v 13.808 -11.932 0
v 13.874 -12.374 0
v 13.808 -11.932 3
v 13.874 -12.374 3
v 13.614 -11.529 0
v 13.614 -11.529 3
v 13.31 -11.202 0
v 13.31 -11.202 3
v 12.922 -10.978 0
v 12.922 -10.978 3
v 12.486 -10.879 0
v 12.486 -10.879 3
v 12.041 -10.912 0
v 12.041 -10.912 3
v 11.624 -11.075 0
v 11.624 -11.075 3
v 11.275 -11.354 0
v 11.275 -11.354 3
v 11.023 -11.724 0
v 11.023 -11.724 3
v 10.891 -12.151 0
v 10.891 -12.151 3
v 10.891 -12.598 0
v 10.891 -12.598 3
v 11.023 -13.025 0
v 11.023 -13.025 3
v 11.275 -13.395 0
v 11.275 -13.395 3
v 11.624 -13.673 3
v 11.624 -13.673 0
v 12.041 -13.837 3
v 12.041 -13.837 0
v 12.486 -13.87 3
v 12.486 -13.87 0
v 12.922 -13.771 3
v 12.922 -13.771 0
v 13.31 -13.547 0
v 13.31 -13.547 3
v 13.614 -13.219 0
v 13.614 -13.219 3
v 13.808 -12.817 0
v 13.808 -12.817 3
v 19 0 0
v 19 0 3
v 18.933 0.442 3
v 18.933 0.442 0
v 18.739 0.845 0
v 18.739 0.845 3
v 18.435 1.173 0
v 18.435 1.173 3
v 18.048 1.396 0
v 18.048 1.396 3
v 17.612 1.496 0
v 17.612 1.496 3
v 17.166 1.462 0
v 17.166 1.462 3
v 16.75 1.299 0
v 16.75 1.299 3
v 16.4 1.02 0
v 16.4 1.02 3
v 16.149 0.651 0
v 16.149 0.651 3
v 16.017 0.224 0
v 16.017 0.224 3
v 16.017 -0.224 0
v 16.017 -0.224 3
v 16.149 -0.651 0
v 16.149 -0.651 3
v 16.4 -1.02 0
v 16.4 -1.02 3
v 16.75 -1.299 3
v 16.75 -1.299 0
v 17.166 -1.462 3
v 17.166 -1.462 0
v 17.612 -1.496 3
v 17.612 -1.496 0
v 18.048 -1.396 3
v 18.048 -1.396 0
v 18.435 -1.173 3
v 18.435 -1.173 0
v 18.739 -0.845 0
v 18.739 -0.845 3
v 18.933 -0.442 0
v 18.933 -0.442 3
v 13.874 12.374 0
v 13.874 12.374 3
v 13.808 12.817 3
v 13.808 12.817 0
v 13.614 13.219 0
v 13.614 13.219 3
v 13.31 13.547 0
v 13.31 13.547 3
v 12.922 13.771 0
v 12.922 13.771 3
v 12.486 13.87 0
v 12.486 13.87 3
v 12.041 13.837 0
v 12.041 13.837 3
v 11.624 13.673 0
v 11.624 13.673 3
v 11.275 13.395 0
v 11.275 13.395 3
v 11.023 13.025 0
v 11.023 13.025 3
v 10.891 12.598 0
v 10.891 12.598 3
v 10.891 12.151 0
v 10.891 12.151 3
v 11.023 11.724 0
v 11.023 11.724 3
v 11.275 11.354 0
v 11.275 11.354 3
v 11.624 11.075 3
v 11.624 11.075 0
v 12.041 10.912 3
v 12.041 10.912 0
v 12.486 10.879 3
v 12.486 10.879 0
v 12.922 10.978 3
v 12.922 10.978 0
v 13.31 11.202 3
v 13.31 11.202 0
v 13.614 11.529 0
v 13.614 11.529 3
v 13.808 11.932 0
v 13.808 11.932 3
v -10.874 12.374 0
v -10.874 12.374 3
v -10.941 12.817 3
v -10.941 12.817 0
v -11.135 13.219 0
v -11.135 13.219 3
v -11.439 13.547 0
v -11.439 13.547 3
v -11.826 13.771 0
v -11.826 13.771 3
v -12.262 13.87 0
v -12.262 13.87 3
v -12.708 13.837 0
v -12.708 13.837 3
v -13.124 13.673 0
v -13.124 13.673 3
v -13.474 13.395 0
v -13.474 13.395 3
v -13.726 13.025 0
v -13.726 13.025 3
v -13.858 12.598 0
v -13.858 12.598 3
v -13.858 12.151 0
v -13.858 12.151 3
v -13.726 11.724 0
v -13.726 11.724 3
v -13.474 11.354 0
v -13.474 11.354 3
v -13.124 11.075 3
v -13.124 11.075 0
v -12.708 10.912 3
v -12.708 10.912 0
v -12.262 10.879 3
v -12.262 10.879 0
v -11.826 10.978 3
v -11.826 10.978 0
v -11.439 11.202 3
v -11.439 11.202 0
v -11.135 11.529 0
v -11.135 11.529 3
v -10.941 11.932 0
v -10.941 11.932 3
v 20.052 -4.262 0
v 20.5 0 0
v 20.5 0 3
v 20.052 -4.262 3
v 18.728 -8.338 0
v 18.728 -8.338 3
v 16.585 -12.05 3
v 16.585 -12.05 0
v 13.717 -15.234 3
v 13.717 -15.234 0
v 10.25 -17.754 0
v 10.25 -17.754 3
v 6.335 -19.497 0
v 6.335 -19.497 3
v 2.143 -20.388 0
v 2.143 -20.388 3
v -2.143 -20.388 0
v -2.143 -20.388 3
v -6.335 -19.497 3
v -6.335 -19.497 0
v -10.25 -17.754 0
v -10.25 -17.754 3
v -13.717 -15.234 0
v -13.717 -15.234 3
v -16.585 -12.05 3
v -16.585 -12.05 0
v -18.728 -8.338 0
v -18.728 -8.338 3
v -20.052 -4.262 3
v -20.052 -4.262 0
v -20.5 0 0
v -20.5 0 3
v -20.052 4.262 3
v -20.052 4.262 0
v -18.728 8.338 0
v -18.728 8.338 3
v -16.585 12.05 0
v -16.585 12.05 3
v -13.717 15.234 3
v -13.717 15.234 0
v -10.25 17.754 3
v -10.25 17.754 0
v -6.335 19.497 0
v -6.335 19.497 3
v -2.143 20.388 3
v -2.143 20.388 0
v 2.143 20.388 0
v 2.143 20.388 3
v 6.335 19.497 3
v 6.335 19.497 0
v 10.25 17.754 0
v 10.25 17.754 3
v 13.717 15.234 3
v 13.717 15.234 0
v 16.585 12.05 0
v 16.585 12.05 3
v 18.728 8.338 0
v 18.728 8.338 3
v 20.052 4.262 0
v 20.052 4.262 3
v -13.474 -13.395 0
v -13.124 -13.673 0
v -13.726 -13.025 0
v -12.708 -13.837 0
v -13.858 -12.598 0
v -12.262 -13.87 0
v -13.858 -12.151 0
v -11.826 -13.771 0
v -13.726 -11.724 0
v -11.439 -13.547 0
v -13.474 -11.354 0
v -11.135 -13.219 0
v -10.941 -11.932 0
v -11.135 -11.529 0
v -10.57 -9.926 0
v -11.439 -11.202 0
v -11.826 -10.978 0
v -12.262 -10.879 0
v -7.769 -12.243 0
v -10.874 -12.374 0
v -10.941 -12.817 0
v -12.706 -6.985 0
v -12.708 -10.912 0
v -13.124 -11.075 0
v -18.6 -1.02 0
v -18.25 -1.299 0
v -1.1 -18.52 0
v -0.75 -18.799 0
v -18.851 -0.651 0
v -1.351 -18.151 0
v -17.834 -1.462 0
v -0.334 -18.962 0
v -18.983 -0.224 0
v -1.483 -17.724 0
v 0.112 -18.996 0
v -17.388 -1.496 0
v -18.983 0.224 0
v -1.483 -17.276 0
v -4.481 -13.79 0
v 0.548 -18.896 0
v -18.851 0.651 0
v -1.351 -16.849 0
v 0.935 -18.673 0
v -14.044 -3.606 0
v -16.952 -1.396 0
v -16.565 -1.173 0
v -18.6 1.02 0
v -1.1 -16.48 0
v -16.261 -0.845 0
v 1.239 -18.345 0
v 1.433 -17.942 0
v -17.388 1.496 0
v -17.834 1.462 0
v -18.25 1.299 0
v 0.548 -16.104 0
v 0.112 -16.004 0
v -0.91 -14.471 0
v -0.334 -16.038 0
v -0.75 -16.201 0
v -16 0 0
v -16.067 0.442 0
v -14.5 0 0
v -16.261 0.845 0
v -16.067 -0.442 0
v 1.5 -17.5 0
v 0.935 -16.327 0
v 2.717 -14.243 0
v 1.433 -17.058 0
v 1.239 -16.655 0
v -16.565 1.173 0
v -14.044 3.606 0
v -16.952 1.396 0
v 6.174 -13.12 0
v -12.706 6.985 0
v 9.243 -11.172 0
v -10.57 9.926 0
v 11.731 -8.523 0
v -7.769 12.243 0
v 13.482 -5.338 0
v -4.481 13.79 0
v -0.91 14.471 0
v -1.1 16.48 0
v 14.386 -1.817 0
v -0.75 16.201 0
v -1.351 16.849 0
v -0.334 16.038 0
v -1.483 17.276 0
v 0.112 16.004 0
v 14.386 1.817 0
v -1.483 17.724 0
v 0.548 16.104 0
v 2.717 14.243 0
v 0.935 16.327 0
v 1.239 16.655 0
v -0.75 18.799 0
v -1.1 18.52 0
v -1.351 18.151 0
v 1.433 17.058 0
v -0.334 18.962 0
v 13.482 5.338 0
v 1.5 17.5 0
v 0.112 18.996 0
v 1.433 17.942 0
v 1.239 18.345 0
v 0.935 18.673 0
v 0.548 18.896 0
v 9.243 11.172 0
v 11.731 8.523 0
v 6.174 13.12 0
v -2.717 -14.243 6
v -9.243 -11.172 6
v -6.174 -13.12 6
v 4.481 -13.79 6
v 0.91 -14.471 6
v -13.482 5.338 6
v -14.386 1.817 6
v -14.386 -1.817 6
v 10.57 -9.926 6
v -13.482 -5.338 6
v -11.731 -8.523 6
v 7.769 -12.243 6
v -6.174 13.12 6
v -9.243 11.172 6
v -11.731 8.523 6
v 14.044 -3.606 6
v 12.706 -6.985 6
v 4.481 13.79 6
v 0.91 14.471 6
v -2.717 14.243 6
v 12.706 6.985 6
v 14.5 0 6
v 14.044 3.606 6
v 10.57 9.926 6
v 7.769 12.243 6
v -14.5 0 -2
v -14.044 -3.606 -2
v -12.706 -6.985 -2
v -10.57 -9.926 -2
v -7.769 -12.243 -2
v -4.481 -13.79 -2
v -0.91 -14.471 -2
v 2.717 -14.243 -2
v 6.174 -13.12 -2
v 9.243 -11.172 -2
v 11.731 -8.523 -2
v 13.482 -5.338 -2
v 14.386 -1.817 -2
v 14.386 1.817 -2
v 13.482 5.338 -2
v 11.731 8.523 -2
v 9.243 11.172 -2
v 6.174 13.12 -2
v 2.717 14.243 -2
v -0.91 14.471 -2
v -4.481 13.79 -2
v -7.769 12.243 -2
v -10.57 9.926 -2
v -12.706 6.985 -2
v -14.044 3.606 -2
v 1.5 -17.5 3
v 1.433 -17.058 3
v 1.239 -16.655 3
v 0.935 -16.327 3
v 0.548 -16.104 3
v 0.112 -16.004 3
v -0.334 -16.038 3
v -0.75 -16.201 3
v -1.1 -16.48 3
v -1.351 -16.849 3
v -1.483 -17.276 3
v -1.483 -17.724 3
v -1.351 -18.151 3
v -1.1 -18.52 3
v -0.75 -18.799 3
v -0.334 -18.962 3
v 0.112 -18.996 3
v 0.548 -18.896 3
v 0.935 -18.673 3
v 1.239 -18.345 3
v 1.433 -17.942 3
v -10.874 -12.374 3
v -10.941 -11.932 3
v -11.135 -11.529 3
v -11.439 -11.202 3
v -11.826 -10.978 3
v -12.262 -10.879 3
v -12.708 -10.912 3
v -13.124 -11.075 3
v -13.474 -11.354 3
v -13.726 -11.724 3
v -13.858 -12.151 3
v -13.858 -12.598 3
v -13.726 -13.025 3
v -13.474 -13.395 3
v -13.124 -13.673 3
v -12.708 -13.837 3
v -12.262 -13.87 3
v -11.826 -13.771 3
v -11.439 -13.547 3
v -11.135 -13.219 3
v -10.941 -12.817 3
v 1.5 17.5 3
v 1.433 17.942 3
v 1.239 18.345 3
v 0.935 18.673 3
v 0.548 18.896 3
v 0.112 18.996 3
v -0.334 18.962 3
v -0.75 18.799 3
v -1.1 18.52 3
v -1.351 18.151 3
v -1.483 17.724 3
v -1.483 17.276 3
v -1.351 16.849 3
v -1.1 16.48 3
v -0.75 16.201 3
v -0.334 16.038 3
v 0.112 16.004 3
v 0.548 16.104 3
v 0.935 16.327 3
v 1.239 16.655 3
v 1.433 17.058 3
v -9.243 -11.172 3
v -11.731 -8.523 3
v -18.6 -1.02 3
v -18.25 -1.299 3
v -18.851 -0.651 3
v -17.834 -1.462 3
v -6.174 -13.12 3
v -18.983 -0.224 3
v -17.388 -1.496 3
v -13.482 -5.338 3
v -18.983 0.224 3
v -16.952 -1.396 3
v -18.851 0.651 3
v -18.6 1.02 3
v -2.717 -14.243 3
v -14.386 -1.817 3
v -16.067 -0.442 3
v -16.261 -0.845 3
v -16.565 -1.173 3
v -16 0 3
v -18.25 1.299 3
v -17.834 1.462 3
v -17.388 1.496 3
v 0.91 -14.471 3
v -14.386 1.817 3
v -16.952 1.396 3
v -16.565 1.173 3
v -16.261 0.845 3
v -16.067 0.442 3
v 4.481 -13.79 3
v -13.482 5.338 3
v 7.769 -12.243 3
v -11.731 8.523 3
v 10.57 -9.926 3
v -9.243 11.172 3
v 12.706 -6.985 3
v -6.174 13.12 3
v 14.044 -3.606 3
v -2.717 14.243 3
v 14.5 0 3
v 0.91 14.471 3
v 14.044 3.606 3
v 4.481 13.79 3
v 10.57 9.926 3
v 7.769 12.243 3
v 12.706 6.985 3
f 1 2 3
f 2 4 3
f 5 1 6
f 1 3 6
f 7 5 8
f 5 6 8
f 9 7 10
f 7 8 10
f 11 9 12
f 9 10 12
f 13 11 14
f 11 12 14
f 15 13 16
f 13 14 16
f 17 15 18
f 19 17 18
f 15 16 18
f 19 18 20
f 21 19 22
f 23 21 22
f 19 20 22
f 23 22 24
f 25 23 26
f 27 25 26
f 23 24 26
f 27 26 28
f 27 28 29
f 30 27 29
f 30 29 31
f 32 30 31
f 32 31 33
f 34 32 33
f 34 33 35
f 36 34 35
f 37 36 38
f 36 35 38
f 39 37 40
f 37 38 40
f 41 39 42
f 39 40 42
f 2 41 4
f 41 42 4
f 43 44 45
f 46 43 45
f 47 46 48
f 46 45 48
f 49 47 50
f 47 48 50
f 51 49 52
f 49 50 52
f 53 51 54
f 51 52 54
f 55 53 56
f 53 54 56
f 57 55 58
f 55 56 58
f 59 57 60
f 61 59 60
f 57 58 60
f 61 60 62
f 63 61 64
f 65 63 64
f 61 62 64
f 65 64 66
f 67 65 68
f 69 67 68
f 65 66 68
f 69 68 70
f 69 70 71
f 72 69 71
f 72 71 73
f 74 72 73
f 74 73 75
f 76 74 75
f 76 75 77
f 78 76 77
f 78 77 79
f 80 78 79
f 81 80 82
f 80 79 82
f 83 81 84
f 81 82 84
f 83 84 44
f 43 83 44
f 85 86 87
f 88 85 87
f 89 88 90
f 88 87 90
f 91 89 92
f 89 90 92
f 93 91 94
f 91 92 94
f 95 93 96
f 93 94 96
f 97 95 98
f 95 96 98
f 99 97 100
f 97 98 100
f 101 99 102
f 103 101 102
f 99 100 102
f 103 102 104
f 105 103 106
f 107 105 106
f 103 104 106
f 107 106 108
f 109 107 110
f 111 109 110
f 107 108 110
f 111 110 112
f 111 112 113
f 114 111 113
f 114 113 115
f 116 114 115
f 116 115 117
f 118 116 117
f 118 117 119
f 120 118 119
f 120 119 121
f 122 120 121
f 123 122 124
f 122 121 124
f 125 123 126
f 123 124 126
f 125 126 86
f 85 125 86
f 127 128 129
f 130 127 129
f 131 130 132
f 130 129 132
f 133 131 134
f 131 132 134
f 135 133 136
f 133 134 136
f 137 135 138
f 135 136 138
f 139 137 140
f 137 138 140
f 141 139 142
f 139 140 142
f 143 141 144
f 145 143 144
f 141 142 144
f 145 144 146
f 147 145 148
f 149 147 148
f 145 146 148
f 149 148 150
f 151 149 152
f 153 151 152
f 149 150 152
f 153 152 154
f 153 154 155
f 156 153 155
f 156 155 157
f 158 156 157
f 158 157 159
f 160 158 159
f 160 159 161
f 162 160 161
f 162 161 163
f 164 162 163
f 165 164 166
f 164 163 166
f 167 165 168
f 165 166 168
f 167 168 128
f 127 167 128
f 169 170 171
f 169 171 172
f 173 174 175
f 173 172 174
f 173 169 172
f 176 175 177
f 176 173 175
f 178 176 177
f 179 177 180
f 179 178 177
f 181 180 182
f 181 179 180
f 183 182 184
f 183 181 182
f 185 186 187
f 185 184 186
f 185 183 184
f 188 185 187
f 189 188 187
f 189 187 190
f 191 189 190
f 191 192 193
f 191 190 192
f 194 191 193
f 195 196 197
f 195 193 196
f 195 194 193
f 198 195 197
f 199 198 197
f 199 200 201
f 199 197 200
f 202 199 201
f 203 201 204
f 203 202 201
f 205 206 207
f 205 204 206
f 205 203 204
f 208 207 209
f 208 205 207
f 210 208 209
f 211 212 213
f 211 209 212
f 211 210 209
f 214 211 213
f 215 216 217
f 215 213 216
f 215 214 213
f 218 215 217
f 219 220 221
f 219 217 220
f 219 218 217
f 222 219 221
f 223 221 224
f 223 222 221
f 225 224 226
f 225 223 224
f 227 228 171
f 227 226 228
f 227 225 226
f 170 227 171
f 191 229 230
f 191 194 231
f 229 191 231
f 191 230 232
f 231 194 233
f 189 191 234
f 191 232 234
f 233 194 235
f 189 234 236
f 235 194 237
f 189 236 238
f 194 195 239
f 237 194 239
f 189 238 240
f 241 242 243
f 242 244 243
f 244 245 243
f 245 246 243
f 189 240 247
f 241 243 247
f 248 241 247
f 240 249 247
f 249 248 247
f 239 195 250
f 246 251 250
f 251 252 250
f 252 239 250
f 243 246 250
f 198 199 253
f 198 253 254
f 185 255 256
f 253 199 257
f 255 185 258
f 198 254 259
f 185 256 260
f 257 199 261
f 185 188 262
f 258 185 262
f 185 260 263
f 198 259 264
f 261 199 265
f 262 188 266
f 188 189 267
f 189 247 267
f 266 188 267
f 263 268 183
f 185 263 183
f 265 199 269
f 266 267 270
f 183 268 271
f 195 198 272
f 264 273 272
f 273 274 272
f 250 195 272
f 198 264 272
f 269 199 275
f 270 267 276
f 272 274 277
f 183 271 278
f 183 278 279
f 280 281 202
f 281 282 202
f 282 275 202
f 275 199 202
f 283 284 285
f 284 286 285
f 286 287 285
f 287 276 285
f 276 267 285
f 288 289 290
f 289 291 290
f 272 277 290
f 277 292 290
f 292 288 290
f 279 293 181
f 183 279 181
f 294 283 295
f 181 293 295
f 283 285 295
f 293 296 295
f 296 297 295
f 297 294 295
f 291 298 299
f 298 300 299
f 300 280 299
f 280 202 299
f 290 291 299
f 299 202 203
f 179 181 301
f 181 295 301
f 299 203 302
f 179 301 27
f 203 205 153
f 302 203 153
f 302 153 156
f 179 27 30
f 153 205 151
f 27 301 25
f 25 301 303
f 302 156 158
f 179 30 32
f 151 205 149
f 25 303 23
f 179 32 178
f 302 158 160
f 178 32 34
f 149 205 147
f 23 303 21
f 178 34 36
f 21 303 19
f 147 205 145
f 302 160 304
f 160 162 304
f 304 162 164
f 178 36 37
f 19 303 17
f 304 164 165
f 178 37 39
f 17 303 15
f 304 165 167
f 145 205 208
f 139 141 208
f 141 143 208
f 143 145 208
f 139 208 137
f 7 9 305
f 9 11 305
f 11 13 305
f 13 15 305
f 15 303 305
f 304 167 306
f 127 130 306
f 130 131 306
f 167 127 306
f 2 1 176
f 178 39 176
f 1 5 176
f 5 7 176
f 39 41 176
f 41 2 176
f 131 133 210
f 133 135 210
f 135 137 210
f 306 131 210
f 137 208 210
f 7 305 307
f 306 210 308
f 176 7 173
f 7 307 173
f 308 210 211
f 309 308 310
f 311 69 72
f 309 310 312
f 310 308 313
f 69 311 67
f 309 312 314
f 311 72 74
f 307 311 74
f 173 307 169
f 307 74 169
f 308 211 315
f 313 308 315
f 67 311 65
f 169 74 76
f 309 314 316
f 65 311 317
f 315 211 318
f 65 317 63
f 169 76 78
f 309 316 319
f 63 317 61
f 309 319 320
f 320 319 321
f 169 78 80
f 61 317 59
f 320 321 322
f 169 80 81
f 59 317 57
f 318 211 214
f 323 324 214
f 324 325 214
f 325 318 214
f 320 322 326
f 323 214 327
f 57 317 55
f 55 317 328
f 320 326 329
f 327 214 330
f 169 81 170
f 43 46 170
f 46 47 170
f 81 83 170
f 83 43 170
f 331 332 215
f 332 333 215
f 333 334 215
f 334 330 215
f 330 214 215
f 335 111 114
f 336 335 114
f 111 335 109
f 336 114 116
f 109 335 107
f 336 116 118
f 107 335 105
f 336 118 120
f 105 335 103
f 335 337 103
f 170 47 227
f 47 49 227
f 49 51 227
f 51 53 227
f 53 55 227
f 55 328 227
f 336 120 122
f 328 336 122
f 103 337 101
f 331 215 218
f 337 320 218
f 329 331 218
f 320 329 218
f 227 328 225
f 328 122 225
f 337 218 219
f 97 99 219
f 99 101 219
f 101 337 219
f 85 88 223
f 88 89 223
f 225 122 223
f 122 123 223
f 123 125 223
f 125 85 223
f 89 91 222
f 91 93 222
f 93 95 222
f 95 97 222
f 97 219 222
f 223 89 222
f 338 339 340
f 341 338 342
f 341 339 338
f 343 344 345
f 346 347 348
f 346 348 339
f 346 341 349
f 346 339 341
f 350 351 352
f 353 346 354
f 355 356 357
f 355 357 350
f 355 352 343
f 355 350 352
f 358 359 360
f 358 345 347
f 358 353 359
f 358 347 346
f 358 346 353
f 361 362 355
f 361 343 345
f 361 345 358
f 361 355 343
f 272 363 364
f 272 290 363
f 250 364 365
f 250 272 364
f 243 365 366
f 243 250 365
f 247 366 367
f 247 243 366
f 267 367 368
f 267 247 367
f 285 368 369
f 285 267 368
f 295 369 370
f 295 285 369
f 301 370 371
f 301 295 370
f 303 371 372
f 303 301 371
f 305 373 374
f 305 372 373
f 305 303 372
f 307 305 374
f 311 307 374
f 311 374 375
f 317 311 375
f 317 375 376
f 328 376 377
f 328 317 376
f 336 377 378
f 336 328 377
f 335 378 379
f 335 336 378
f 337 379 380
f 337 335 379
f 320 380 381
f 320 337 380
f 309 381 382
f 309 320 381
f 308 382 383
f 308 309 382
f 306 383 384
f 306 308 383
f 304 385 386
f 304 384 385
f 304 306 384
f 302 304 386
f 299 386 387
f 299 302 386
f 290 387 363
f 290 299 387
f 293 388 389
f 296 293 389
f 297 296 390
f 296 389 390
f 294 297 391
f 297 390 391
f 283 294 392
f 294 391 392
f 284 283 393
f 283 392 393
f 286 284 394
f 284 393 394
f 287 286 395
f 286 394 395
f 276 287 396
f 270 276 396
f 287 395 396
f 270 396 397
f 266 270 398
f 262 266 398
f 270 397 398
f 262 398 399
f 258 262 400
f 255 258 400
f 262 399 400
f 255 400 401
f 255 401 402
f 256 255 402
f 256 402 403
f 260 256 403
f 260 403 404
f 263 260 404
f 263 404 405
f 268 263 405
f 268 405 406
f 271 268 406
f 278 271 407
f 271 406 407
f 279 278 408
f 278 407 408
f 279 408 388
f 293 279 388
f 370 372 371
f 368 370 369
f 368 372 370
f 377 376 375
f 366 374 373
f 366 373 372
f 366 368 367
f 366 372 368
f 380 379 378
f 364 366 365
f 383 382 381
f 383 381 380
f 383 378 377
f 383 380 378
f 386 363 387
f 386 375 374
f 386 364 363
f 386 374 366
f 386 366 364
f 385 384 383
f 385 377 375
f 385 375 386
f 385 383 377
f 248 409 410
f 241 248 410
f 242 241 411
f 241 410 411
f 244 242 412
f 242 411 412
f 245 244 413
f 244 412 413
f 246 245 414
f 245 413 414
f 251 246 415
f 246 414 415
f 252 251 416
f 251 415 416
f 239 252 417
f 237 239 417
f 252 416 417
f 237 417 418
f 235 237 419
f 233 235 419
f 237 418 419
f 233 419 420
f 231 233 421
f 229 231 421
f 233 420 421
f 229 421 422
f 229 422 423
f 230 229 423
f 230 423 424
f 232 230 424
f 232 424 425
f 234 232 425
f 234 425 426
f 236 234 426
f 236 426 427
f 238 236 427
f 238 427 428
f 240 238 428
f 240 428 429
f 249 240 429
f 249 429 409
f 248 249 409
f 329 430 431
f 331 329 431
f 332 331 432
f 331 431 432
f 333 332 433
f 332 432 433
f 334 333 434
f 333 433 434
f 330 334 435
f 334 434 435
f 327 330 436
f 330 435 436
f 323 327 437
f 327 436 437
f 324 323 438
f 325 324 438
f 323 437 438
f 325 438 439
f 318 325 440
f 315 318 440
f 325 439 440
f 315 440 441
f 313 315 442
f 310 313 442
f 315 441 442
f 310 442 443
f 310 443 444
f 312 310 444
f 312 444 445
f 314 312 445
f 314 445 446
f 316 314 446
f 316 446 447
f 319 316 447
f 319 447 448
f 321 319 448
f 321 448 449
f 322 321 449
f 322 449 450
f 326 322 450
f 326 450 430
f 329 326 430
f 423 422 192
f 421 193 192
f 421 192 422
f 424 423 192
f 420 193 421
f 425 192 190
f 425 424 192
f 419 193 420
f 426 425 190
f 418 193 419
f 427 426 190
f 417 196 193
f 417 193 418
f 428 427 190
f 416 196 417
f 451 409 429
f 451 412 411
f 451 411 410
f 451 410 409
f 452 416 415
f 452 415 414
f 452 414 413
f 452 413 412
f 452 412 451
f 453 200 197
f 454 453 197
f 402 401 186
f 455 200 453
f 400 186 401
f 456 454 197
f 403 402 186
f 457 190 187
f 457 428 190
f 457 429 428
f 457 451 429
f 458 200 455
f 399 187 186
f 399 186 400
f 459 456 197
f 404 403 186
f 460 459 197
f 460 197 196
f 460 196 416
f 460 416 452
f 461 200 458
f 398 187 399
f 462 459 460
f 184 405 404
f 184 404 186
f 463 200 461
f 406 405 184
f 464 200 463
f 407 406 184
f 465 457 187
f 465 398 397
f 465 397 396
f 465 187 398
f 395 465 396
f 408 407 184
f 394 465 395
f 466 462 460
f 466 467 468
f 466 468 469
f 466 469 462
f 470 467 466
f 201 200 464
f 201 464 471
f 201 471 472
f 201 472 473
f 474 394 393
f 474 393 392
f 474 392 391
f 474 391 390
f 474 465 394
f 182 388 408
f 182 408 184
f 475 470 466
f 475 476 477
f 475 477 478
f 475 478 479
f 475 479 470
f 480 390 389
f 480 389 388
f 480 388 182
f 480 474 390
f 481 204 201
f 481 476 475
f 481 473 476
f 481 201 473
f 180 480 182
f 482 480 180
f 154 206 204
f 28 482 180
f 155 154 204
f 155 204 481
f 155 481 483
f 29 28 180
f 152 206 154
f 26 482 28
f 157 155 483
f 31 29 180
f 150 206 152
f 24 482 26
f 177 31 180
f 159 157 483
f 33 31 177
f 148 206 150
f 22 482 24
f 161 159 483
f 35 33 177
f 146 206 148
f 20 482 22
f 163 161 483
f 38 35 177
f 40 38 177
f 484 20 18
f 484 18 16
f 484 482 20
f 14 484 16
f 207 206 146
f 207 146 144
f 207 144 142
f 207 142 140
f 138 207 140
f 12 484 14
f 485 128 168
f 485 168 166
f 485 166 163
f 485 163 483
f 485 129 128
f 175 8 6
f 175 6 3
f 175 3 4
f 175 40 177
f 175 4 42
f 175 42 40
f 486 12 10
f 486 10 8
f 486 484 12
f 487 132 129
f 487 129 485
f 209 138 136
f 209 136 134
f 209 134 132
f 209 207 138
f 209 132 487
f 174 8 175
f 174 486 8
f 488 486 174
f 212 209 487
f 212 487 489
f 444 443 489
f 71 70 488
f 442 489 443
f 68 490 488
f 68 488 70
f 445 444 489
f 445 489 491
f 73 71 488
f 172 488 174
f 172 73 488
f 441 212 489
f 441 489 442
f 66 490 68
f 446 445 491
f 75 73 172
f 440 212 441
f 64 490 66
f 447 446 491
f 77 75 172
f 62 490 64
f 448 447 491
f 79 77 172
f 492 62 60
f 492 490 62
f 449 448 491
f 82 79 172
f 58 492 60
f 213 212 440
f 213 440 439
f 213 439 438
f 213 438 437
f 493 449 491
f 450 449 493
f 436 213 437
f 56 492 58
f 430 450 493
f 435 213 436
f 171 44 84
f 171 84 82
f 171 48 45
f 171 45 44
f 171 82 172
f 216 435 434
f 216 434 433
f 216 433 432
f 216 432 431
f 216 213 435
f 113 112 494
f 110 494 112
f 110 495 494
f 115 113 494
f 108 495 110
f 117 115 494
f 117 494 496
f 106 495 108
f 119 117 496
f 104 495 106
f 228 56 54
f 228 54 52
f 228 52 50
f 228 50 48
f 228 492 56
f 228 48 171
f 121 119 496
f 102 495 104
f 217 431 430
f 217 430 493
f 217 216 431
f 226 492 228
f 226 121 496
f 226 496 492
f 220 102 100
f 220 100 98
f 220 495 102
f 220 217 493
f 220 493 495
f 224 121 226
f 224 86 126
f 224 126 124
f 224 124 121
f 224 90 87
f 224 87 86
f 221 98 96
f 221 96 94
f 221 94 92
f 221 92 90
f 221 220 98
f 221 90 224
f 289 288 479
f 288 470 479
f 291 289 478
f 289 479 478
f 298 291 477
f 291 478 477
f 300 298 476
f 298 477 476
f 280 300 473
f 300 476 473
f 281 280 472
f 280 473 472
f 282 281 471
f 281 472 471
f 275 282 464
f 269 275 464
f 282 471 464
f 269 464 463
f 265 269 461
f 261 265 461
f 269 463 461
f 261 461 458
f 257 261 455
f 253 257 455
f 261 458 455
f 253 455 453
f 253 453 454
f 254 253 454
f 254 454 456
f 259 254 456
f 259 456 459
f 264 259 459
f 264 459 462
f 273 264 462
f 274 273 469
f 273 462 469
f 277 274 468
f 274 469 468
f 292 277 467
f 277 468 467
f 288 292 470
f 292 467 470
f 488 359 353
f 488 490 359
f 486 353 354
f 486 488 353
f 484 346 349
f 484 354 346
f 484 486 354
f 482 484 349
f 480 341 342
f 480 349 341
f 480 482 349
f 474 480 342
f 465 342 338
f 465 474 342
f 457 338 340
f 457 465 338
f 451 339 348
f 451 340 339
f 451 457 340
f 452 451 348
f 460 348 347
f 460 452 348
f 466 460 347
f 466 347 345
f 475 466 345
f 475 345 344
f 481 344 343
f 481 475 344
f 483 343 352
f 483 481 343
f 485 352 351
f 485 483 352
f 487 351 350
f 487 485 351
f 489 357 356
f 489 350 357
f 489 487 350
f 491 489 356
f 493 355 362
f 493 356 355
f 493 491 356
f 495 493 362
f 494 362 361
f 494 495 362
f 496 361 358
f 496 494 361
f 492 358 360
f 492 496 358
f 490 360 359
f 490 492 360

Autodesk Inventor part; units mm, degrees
ref_plane "YZ Plane" through (0, 0, 0) normal (1, 0, 0) x (0, 1, 0)
ref_plane "XZ Plane" through (0, 0, 0) normal (0, 1, 0) x (-1, 0, 0)
ref_plane "XY Plane" through (0, 0, 0) normal (0, 0, 1) x (1, 0, 0)
sketch "Sketch1" plane through (0, 0, 0) normal (0, 0, 1) x (1, 0, 0)
  circle A0 centre (0, 0) radius 20.5
  dimension "d0" = 41
extrude "Extrusion1" add sketch "Sketch1" along normal blind 3
sketch "Sketch2" plane through (0, 0, 3) normal (0, 0, 1) x (1, 0, 0)
  circle A0 centre (0, 0) radius 20.5 projected
  circle A1 centre (0, 0) radius 14.5
  dimension "d3" = 29
extrude "Extrusion2" add sketch "Sketch2" along normal blind 3 contours A1
sketch "Sketch3" plane through (0, 0, 0) normal (0, 0, -1) x (-1, 0, 0)
  circle A0 centre (0, 0) radius 20.5 projected
  circle A1 centre (0, 0) radius 14.5
  dimension "d6" = 29
extrude "Extrusion3" add sketch "Sketch3" along normal blind 2 contours A1
sketch "Sketch4" plane through (0, 0, 3) normal (0, 0, 1) x (1, 0, 0)
  circle A0 centre (0, 0) radius 14.5 projected
  circle A1 centre (0, 0) radius 20.5 projected
  circle A2 centre (0, 0) radius 17.5
  circle A3 centre (0, 17.5) radius 1.5
  circle A4 centre (-12.3744, 12.3744) radius 1.5
  circle A5 centre (-17.5, 0) radius 1.5
  circle A6 centre (-12.3744, -12.3744) radius 1.5
  circle A7 centre (0, -17.5) radius 1.5
  circle A8 centre (12.3744, -12.3744) radius 1.5
  circle A9 centre (17.5, 0) radius 1.5
  circle A10 centre (12.3744, 12.3744) radius 1.5
  dimension "d9" = 35
  dimension "d10" = 3
  dimension "d13" = 360
extrude "Extrusion4" cut sketch "Sketch4" against normal through all contours A2 A9 | A2 A9 | A10 A2 | A2 A10 | A8 A2 | A2 A8 | A3 A2 | A2 A3 | A7 A2 | A2 A7 | A4 A2 | A2 A4 | A6 A2 | A2 A6 | A5 A2 | A2 A5
properties part number "07 CYLINDER FRONT COVER" material "Steel AISI 1020 107 HR"
